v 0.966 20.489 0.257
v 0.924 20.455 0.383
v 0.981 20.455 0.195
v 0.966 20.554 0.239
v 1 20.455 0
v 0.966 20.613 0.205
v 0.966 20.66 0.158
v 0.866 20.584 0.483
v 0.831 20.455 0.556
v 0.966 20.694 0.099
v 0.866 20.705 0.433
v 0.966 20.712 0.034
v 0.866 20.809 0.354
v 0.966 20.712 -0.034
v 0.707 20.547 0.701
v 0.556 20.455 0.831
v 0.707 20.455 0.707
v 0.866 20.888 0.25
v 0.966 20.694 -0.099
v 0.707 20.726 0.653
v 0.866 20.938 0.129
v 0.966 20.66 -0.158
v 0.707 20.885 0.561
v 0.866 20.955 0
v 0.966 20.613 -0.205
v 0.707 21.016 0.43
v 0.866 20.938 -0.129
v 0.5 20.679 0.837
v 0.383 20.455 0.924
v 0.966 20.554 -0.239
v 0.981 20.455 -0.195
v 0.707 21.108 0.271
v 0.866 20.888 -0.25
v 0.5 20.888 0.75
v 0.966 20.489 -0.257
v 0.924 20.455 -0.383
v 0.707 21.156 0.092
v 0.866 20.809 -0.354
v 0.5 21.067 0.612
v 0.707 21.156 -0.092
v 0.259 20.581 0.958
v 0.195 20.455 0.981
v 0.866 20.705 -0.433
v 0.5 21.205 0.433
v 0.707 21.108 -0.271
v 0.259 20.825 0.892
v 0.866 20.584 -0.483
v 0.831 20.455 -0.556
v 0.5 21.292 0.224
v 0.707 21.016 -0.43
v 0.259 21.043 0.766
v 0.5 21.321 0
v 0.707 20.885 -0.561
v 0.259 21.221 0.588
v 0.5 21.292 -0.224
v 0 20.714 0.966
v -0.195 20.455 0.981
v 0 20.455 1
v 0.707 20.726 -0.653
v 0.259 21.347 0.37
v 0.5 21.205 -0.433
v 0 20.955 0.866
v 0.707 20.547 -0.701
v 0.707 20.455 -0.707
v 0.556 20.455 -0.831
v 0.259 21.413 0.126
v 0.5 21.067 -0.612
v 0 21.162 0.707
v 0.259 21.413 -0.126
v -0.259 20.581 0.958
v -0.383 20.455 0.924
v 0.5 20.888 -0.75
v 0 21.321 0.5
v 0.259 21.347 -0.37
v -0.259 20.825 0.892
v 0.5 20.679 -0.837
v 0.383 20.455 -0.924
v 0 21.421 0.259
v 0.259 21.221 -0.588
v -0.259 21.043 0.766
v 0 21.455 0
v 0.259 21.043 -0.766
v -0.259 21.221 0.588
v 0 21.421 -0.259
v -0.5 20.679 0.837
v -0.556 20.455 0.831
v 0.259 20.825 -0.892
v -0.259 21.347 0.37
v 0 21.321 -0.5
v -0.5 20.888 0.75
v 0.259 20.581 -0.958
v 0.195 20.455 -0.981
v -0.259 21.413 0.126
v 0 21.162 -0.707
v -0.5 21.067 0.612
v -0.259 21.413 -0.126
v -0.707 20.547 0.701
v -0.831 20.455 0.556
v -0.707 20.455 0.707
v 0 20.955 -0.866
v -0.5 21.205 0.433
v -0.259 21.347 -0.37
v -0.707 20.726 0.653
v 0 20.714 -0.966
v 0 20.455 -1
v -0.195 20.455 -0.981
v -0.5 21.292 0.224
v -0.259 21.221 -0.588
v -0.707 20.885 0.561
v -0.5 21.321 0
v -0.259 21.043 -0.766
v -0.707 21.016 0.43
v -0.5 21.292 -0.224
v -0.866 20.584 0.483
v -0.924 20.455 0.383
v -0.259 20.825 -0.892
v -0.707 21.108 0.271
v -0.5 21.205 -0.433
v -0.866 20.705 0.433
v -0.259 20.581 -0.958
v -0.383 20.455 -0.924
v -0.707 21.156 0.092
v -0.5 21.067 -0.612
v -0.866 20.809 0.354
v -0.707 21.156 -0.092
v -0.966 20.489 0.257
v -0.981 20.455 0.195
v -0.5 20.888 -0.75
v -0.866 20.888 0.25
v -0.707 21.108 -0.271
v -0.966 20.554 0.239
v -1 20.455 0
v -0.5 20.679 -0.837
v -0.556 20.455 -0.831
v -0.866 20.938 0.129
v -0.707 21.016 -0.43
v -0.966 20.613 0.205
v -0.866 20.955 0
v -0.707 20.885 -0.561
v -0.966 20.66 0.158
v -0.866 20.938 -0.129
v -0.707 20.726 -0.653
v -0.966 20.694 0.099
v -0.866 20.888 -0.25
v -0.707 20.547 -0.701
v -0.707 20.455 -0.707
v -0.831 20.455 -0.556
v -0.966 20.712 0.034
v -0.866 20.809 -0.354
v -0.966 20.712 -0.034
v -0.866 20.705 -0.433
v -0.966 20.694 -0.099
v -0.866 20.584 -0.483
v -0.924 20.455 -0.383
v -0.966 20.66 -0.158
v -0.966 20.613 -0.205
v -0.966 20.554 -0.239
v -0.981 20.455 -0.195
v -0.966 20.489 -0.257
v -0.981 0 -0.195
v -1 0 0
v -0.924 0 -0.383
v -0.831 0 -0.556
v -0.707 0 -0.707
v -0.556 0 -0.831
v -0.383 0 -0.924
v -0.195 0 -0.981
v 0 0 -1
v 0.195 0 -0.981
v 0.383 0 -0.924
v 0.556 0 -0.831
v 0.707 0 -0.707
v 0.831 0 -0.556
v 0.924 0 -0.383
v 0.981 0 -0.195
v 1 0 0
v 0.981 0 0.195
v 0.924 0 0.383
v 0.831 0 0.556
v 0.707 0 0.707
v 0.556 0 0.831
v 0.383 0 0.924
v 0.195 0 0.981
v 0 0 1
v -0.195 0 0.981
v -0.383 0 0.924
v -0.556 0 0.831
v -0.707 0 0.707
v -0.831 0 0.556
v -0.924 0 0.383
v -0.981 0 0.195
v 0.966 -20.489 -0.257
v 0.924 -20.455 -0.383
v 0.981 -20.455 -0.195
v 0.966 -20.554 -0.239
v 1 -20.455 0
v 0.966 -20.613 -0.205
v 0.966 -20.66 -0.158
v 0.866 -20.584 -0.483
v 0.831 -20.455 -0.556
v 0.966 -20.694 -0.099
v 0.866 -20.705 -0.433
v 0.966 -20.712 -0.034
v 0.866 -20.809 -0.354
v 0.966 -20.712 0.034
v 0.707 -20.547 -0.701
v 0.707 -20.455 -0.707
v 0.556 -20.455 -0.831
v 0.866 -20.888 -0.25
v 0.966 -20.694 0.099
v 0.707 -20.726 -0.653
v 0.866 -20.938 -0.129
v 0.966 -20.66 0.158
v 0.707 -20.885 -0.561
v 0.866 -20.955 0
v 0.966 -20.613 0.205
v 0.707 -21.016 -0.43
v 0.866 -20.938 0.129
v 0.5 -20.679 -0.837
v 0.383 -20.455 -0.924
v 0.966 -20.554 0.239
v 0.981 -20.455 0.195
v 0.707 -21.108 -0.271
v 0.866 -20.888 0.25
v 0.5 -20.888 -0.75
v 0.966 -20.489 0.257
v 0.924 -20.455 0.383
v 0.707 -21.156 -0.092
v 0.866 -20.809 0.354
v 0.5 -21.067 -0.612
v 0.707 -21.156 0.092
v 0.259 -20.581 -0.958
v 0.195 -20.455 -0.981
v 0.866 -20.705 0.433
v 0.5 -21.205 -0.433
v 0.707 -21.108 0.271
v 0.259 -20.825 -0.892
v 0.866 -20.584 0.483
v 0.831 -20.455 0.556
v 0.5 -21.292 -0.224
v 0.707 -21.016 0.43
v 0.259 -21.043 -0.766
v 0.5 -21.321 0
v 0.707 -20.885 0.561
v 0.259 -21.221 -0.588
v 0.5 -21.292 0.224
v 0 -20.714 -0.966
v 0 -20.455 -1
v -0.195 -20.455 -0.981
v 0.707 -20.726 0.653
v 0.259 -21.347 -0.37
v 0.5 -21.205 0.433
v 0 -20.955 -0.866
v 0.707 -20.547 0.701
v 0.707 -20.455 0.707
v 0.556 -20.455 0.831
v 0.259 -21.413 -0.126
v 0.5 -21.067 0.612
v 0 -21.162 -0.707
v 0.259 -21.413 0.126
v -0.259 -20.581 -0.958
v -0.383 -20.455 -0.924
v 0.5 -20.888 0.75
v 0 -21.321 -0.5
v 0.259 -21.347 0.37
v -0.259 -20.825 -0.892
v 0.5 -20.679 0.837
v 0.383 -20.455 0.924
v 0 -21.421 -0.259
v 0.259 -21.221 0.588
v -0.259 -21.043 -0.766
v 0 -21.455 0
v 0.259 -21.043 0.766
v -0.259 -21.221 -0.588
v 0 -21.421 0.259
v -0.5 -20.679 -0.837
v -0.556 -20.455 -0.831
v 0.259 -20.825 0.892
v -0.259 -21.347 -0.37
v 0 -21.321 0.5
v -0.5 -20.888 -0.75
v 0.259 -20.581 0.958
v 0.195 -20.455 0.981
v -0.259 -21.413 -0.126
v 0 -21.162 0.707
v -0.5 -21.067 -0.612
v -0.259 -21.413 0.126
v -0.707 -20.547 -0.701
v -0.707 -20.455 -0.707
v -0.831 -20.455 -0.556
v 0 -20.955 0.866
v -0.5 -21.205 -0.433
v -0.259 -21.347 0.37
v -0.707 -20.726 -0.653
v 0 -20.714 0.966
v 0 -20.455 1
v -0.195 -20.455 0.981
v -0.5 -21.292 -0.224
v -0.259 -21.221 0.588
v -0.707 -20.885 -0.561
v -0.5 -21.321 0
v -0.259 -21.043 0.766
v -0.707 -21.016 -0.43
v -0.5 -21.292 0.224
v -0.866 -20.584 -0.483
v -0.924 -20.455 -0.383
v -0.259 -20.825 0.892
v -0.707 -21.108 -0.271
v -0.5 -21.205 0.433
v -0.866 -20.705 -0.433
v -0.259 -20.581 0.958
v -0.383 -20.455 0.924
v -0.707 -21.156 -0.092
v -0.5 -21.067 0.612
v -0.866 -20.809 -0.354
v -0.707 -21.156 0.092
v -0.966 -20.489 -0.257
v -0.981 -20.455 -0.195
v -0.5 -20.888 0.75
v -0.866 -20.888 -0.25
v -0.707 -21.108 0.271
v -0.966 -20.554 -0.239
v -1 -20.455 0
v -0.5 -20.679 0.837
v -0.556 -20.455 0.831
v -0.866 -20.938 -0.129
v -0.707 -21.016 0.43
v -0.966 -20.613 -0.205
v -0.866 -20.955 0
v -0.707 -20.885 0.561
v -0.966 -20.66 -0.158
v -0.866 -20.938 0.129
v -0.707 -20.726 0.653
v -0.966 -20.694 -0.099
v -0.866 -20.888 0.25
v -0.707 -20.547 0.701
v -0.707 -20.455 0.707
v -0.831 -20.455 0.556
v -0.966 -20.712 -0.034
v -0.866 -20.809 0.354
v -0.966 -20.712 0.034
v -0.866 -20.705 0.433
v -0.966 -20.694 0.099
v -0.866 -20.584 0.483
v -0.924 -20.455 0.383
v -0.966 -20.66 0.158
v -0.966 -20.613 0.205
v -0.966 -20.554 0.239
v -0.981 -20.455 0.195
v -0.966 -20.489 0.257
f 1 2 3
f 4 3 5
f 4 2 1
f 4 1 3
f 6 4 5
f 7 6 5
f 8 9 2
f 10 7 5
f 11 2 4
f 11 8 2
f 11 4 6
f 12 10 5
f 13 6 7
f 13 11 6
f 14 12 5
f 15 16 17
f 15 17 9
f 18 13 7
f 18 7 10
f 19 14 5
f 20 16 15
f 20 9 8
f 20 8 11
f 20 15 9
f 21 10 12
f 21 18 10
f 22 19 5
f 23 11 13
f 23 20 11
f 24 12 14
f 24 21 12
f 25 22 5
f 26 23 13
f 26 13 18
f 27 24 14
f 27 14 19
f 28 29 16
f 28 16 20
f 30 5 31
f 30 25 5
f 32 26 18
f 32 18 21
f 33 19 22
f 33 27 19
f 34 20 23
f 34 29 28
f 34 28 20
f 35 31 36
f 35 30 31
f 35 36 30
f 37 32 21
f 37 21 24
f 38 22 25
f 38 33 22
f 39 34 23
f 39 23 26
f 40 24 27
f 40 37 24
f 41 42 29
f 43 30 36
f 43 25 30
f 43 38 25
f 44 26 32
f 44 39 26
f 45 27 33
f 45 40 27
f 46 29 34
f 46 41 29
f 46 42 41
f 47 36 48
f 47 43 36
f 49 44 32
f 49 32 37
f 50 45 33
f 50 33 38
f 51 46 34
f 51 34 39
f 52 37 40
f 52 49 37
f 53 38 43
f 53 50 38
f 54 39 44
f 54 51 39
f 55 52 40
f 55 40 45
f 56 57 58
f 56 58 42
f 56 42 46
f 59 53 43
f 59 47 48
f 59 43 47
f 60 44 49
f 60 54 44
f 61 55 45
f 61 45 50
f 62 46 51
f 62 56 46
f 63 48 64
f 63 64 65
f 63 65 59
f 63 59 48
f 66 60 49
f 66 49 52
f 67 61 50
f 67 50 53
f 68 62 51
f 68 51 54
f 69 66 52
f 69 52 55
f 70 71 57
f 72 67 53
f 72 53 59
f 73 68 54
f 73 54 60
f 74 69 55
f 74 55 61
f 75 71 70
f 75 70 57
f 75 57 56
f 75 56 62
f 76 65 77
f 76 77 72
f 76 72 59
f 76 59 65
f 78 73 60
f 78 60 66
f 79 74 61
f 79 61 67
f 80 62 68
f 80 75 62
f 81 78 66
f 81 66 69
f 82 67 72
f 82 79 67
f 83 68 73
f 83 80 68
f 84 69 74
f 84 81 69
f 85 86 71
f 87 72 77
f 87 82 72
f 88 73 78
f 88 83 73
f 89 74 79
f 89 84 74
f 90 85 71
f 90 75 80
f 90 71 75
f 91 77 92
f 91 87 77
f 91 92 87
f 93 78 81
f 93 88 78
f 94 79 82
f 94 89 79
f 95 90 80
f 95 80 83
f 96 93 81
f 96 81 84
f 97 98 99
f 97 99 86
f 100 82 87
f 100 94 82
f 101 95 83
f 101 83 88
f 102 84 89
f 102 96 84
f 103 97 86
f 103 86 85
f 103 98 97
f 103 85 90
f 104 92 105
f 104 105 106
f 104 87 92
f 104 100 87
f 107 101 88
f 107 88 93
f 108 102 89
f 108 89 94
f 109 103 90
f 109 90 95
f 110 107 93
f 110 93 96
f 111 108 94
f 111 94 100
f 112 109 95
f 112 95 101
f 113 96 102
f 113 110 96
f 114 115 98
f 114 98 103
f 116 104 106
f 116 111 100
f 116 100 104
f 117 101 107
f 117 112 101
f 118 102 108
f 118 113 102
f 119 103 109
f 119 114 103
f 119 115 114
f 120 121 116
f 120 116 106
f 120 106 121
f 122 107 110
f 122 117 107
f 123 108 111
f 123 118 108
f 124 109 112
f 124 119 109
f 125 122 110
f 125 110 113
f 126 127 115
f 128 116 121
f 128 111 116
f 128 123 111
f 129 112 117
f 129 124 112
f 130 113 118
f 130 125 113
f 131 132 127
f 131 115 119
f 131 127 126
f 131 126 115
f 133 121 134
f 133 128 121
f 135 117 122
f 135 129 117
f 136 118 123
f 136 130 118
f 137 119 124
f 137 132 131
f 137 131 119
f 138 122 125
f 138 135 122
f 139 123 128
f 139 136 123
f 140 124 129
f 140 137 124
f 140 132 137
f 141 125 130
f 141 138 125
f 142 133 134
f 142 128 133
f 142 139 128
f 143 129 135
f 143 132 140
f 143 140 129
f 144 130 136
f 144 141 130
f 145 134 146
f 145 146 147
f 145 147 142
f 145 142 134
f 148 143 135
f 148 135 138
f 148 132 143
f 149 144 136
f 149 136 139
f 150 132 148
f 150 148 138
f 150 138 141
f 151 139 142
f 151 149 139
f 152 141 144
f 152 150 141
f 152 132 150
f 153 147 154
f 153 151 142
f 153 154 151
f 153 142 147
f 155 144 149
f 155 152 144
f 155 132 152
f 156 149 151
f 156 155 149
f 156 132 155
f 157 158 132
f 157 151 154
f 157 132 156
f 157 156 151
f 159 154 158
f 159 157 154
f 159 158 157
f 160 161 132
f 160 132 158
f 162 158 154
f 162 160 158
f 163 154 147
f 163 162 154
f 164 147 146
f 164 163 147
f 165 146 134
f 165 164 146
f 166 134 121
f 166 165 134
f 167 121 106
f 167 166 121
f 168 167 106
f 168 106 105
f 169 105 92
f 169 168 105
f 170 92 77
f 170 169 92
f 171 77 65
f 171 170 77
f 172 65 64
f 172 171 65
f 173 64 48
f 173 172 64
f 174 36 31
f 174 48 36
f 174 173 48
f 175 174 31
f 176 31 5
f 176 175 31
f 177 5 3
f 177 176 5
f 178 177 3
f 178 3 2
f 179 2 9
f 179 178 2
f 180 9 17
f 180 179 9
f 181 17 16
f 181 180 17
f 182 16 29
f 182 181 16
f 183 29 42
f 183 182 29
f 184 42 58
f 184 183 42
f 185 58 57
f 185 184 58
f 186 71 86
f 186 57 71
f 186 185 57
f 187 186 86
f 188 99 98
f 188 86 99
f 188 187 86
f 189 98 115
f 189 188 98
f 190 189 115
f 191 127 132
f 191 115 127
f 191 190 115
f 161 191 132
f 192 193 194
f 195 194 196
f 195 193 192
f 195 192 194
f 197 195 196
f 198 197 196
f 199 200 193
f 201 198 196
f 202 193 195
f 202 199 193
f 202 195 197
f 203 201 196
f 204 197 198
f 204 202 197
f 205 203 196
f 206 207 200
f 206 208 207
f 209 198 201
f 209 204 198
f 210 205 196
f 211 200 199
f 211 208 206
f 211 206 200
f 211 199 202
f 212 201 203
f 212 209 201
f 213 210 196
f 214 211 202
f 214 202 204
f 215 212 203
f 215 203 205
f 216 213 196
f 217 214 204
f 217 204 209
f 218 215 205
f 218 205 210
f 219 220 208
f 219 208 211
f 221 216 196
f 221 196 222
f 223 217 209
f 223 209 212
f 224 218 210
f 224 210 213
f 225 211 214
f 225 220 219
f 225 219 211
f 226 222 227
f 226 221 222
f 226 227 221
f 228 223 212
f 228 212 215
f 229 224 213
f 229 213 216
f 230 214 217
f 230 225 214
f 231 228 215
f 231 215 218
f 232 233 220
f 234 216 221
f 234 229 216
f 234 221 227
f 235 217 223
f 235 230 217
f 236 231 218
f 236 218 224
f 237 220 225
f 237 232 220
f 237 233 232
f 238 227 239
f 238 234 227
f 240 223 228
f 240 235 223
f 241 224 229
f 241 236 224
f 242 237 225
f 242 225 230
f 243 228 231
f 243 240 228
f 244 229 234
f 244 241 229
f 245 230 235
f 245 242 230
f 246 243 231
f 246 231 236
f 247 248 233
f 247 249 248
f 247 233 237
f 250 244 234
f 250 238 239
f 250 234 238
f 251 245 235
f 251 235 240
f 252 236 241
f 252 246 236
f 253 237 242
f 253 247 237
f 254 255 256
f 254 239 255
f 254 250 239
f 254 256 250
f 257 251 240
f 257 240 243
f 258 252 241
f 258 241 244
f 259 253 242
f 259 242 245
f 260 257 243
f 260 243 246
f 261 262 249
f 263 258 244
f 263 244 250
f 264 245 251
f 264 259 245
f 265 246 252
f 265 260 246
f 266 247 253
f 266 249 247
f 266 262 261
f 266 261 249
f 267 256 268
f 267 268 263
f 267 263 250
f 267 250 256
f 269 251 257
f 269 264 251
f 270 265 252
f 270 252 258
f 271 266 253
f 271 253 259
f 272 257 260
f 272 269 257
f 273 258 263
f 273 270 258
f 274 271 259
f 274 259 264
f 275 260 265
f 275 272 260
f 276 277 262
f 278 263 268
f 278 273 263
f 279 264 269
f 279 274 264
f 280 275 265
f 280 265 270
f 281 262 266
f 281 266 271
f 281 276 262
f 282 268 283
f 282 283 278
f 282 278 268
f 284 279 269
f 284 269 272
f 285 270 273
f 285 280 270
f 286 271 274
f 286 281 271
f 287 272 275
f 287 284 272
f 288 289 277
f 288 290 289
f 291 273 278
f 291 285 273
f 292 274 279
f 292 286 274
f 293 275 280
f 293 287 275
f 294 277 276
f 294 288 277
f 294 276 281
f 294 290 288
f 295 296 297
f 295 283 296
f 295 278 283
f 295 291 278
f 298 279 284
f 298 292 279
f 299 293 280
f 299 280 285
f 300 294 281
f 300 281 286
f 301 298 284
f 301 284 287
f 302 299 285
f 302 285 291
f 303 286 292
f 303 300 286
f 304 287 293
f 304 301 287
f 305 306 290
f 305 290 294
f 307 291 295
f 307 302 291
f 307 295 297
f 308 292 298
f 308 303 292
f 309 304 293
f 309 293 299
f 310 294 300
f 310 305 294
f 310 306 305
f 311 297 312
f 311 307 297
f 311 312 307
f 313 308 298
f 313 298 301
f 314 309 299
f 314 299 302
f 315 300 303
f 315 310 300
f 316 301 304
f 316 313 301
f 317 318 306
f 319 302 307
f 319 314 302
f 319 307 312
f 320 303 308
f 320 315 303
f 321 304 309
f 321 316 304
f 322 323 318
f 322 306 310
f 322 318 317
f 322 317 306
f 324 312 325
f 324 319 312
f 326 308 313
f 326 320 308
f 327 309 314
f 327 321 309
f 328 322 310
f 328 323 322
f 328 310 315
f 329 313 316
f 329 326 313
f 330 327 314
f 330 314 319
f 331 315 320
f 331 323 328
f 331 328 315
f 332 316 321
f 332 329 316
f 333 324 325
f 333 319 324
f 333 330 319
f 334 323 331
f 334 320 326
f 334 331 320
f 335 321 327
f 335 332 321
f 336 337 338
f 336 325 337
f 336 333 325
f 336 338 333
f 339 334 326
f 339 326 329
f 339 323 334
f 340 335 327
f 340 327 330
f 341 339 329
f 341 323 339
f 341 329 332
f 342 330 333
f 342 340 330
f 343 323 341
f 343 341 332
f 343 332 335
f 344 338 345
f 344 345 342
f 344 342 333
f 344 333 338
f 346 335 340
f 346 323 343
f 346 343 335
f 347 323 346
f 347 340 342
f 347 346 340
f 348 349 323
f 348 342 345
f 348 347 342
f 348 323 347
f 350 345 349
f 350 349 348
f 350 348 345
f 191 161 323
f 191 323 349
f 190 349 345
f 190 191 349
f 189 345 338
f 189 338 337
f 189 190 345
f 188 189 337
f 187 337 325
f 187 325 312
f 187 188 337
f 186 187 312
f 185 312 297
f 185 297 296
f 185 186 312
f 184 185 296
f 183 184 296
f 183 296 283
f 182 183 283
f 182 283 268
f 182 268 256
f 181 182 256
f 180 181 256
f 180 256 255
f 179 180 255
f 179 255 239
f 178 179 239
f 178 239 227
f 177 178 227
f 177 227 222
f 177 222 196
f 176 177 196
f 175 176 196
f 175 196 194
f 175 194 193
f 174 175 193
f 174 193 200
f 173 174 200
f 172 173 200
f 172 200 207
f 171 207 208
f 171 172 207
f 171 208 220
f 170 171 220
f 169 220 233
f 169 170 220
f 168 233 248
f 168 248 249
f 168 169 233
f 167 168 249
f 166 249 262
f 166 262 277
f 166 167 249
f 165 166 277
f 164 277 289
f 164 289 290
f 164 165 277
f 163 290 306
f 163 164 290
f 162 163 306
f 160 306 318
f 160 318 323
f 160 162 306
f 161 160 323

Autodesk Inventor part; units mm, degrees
ref_plane "YZ Plane" through (0, 0, 0) normal (1, 0, 0) x (0, 1, 0)
ref_plane "XZ Plane" through (0, 0, 0) normal (0, 1, 0) x (-1, 0, 0)
ref_plane "XY Plane" through (0, 0, 0) normal (0, 0, 1) x (1, 0, 0)
sketch "Boceto1" plane through (0, 0, 0) normal (0, 1, 0) x (-1, 0, 0)
  circle A0 centre (0, 0) radius 1
  dimension "d0" = 2
extrude "Extrusión1" add sketch "Boceto1" along normal mid plane 40.91
sketch "Boceto2" plane through (0, 20.455, 0) normal (0, 1, 0) x (1, 0, 0)
  circle A0 centre (0, 0) radius 1 projected
  circle A1 centre (0, 0) radius 1
  line L0 (1, 0) -> (-1, 0)
revolve "Revolución1" add sketch "Boceto2" angle 360 about axis through (1, 20.455, 0) along (-1, 0, 0) picked at (0.2495, 0.221) contours L0 A0
sketch "Boceto3" plane through (0, -20.455, 0) normal (0, -1, 0) x (1, 0, 0)
  circle A0 centre (0, 0) radius 1 projected
  circle A1 centre (0, 0) radius 1
  line L0 (1, 0) -> (-1, 0)
revolve "Revolución2" add sketch "Boceto3" angle 360 about axis through (1, -20.455, 0) along (-1, 0, 0) picked at (0.2495, 0.221) contours L0 A0
properties part number "EjeMotor"
